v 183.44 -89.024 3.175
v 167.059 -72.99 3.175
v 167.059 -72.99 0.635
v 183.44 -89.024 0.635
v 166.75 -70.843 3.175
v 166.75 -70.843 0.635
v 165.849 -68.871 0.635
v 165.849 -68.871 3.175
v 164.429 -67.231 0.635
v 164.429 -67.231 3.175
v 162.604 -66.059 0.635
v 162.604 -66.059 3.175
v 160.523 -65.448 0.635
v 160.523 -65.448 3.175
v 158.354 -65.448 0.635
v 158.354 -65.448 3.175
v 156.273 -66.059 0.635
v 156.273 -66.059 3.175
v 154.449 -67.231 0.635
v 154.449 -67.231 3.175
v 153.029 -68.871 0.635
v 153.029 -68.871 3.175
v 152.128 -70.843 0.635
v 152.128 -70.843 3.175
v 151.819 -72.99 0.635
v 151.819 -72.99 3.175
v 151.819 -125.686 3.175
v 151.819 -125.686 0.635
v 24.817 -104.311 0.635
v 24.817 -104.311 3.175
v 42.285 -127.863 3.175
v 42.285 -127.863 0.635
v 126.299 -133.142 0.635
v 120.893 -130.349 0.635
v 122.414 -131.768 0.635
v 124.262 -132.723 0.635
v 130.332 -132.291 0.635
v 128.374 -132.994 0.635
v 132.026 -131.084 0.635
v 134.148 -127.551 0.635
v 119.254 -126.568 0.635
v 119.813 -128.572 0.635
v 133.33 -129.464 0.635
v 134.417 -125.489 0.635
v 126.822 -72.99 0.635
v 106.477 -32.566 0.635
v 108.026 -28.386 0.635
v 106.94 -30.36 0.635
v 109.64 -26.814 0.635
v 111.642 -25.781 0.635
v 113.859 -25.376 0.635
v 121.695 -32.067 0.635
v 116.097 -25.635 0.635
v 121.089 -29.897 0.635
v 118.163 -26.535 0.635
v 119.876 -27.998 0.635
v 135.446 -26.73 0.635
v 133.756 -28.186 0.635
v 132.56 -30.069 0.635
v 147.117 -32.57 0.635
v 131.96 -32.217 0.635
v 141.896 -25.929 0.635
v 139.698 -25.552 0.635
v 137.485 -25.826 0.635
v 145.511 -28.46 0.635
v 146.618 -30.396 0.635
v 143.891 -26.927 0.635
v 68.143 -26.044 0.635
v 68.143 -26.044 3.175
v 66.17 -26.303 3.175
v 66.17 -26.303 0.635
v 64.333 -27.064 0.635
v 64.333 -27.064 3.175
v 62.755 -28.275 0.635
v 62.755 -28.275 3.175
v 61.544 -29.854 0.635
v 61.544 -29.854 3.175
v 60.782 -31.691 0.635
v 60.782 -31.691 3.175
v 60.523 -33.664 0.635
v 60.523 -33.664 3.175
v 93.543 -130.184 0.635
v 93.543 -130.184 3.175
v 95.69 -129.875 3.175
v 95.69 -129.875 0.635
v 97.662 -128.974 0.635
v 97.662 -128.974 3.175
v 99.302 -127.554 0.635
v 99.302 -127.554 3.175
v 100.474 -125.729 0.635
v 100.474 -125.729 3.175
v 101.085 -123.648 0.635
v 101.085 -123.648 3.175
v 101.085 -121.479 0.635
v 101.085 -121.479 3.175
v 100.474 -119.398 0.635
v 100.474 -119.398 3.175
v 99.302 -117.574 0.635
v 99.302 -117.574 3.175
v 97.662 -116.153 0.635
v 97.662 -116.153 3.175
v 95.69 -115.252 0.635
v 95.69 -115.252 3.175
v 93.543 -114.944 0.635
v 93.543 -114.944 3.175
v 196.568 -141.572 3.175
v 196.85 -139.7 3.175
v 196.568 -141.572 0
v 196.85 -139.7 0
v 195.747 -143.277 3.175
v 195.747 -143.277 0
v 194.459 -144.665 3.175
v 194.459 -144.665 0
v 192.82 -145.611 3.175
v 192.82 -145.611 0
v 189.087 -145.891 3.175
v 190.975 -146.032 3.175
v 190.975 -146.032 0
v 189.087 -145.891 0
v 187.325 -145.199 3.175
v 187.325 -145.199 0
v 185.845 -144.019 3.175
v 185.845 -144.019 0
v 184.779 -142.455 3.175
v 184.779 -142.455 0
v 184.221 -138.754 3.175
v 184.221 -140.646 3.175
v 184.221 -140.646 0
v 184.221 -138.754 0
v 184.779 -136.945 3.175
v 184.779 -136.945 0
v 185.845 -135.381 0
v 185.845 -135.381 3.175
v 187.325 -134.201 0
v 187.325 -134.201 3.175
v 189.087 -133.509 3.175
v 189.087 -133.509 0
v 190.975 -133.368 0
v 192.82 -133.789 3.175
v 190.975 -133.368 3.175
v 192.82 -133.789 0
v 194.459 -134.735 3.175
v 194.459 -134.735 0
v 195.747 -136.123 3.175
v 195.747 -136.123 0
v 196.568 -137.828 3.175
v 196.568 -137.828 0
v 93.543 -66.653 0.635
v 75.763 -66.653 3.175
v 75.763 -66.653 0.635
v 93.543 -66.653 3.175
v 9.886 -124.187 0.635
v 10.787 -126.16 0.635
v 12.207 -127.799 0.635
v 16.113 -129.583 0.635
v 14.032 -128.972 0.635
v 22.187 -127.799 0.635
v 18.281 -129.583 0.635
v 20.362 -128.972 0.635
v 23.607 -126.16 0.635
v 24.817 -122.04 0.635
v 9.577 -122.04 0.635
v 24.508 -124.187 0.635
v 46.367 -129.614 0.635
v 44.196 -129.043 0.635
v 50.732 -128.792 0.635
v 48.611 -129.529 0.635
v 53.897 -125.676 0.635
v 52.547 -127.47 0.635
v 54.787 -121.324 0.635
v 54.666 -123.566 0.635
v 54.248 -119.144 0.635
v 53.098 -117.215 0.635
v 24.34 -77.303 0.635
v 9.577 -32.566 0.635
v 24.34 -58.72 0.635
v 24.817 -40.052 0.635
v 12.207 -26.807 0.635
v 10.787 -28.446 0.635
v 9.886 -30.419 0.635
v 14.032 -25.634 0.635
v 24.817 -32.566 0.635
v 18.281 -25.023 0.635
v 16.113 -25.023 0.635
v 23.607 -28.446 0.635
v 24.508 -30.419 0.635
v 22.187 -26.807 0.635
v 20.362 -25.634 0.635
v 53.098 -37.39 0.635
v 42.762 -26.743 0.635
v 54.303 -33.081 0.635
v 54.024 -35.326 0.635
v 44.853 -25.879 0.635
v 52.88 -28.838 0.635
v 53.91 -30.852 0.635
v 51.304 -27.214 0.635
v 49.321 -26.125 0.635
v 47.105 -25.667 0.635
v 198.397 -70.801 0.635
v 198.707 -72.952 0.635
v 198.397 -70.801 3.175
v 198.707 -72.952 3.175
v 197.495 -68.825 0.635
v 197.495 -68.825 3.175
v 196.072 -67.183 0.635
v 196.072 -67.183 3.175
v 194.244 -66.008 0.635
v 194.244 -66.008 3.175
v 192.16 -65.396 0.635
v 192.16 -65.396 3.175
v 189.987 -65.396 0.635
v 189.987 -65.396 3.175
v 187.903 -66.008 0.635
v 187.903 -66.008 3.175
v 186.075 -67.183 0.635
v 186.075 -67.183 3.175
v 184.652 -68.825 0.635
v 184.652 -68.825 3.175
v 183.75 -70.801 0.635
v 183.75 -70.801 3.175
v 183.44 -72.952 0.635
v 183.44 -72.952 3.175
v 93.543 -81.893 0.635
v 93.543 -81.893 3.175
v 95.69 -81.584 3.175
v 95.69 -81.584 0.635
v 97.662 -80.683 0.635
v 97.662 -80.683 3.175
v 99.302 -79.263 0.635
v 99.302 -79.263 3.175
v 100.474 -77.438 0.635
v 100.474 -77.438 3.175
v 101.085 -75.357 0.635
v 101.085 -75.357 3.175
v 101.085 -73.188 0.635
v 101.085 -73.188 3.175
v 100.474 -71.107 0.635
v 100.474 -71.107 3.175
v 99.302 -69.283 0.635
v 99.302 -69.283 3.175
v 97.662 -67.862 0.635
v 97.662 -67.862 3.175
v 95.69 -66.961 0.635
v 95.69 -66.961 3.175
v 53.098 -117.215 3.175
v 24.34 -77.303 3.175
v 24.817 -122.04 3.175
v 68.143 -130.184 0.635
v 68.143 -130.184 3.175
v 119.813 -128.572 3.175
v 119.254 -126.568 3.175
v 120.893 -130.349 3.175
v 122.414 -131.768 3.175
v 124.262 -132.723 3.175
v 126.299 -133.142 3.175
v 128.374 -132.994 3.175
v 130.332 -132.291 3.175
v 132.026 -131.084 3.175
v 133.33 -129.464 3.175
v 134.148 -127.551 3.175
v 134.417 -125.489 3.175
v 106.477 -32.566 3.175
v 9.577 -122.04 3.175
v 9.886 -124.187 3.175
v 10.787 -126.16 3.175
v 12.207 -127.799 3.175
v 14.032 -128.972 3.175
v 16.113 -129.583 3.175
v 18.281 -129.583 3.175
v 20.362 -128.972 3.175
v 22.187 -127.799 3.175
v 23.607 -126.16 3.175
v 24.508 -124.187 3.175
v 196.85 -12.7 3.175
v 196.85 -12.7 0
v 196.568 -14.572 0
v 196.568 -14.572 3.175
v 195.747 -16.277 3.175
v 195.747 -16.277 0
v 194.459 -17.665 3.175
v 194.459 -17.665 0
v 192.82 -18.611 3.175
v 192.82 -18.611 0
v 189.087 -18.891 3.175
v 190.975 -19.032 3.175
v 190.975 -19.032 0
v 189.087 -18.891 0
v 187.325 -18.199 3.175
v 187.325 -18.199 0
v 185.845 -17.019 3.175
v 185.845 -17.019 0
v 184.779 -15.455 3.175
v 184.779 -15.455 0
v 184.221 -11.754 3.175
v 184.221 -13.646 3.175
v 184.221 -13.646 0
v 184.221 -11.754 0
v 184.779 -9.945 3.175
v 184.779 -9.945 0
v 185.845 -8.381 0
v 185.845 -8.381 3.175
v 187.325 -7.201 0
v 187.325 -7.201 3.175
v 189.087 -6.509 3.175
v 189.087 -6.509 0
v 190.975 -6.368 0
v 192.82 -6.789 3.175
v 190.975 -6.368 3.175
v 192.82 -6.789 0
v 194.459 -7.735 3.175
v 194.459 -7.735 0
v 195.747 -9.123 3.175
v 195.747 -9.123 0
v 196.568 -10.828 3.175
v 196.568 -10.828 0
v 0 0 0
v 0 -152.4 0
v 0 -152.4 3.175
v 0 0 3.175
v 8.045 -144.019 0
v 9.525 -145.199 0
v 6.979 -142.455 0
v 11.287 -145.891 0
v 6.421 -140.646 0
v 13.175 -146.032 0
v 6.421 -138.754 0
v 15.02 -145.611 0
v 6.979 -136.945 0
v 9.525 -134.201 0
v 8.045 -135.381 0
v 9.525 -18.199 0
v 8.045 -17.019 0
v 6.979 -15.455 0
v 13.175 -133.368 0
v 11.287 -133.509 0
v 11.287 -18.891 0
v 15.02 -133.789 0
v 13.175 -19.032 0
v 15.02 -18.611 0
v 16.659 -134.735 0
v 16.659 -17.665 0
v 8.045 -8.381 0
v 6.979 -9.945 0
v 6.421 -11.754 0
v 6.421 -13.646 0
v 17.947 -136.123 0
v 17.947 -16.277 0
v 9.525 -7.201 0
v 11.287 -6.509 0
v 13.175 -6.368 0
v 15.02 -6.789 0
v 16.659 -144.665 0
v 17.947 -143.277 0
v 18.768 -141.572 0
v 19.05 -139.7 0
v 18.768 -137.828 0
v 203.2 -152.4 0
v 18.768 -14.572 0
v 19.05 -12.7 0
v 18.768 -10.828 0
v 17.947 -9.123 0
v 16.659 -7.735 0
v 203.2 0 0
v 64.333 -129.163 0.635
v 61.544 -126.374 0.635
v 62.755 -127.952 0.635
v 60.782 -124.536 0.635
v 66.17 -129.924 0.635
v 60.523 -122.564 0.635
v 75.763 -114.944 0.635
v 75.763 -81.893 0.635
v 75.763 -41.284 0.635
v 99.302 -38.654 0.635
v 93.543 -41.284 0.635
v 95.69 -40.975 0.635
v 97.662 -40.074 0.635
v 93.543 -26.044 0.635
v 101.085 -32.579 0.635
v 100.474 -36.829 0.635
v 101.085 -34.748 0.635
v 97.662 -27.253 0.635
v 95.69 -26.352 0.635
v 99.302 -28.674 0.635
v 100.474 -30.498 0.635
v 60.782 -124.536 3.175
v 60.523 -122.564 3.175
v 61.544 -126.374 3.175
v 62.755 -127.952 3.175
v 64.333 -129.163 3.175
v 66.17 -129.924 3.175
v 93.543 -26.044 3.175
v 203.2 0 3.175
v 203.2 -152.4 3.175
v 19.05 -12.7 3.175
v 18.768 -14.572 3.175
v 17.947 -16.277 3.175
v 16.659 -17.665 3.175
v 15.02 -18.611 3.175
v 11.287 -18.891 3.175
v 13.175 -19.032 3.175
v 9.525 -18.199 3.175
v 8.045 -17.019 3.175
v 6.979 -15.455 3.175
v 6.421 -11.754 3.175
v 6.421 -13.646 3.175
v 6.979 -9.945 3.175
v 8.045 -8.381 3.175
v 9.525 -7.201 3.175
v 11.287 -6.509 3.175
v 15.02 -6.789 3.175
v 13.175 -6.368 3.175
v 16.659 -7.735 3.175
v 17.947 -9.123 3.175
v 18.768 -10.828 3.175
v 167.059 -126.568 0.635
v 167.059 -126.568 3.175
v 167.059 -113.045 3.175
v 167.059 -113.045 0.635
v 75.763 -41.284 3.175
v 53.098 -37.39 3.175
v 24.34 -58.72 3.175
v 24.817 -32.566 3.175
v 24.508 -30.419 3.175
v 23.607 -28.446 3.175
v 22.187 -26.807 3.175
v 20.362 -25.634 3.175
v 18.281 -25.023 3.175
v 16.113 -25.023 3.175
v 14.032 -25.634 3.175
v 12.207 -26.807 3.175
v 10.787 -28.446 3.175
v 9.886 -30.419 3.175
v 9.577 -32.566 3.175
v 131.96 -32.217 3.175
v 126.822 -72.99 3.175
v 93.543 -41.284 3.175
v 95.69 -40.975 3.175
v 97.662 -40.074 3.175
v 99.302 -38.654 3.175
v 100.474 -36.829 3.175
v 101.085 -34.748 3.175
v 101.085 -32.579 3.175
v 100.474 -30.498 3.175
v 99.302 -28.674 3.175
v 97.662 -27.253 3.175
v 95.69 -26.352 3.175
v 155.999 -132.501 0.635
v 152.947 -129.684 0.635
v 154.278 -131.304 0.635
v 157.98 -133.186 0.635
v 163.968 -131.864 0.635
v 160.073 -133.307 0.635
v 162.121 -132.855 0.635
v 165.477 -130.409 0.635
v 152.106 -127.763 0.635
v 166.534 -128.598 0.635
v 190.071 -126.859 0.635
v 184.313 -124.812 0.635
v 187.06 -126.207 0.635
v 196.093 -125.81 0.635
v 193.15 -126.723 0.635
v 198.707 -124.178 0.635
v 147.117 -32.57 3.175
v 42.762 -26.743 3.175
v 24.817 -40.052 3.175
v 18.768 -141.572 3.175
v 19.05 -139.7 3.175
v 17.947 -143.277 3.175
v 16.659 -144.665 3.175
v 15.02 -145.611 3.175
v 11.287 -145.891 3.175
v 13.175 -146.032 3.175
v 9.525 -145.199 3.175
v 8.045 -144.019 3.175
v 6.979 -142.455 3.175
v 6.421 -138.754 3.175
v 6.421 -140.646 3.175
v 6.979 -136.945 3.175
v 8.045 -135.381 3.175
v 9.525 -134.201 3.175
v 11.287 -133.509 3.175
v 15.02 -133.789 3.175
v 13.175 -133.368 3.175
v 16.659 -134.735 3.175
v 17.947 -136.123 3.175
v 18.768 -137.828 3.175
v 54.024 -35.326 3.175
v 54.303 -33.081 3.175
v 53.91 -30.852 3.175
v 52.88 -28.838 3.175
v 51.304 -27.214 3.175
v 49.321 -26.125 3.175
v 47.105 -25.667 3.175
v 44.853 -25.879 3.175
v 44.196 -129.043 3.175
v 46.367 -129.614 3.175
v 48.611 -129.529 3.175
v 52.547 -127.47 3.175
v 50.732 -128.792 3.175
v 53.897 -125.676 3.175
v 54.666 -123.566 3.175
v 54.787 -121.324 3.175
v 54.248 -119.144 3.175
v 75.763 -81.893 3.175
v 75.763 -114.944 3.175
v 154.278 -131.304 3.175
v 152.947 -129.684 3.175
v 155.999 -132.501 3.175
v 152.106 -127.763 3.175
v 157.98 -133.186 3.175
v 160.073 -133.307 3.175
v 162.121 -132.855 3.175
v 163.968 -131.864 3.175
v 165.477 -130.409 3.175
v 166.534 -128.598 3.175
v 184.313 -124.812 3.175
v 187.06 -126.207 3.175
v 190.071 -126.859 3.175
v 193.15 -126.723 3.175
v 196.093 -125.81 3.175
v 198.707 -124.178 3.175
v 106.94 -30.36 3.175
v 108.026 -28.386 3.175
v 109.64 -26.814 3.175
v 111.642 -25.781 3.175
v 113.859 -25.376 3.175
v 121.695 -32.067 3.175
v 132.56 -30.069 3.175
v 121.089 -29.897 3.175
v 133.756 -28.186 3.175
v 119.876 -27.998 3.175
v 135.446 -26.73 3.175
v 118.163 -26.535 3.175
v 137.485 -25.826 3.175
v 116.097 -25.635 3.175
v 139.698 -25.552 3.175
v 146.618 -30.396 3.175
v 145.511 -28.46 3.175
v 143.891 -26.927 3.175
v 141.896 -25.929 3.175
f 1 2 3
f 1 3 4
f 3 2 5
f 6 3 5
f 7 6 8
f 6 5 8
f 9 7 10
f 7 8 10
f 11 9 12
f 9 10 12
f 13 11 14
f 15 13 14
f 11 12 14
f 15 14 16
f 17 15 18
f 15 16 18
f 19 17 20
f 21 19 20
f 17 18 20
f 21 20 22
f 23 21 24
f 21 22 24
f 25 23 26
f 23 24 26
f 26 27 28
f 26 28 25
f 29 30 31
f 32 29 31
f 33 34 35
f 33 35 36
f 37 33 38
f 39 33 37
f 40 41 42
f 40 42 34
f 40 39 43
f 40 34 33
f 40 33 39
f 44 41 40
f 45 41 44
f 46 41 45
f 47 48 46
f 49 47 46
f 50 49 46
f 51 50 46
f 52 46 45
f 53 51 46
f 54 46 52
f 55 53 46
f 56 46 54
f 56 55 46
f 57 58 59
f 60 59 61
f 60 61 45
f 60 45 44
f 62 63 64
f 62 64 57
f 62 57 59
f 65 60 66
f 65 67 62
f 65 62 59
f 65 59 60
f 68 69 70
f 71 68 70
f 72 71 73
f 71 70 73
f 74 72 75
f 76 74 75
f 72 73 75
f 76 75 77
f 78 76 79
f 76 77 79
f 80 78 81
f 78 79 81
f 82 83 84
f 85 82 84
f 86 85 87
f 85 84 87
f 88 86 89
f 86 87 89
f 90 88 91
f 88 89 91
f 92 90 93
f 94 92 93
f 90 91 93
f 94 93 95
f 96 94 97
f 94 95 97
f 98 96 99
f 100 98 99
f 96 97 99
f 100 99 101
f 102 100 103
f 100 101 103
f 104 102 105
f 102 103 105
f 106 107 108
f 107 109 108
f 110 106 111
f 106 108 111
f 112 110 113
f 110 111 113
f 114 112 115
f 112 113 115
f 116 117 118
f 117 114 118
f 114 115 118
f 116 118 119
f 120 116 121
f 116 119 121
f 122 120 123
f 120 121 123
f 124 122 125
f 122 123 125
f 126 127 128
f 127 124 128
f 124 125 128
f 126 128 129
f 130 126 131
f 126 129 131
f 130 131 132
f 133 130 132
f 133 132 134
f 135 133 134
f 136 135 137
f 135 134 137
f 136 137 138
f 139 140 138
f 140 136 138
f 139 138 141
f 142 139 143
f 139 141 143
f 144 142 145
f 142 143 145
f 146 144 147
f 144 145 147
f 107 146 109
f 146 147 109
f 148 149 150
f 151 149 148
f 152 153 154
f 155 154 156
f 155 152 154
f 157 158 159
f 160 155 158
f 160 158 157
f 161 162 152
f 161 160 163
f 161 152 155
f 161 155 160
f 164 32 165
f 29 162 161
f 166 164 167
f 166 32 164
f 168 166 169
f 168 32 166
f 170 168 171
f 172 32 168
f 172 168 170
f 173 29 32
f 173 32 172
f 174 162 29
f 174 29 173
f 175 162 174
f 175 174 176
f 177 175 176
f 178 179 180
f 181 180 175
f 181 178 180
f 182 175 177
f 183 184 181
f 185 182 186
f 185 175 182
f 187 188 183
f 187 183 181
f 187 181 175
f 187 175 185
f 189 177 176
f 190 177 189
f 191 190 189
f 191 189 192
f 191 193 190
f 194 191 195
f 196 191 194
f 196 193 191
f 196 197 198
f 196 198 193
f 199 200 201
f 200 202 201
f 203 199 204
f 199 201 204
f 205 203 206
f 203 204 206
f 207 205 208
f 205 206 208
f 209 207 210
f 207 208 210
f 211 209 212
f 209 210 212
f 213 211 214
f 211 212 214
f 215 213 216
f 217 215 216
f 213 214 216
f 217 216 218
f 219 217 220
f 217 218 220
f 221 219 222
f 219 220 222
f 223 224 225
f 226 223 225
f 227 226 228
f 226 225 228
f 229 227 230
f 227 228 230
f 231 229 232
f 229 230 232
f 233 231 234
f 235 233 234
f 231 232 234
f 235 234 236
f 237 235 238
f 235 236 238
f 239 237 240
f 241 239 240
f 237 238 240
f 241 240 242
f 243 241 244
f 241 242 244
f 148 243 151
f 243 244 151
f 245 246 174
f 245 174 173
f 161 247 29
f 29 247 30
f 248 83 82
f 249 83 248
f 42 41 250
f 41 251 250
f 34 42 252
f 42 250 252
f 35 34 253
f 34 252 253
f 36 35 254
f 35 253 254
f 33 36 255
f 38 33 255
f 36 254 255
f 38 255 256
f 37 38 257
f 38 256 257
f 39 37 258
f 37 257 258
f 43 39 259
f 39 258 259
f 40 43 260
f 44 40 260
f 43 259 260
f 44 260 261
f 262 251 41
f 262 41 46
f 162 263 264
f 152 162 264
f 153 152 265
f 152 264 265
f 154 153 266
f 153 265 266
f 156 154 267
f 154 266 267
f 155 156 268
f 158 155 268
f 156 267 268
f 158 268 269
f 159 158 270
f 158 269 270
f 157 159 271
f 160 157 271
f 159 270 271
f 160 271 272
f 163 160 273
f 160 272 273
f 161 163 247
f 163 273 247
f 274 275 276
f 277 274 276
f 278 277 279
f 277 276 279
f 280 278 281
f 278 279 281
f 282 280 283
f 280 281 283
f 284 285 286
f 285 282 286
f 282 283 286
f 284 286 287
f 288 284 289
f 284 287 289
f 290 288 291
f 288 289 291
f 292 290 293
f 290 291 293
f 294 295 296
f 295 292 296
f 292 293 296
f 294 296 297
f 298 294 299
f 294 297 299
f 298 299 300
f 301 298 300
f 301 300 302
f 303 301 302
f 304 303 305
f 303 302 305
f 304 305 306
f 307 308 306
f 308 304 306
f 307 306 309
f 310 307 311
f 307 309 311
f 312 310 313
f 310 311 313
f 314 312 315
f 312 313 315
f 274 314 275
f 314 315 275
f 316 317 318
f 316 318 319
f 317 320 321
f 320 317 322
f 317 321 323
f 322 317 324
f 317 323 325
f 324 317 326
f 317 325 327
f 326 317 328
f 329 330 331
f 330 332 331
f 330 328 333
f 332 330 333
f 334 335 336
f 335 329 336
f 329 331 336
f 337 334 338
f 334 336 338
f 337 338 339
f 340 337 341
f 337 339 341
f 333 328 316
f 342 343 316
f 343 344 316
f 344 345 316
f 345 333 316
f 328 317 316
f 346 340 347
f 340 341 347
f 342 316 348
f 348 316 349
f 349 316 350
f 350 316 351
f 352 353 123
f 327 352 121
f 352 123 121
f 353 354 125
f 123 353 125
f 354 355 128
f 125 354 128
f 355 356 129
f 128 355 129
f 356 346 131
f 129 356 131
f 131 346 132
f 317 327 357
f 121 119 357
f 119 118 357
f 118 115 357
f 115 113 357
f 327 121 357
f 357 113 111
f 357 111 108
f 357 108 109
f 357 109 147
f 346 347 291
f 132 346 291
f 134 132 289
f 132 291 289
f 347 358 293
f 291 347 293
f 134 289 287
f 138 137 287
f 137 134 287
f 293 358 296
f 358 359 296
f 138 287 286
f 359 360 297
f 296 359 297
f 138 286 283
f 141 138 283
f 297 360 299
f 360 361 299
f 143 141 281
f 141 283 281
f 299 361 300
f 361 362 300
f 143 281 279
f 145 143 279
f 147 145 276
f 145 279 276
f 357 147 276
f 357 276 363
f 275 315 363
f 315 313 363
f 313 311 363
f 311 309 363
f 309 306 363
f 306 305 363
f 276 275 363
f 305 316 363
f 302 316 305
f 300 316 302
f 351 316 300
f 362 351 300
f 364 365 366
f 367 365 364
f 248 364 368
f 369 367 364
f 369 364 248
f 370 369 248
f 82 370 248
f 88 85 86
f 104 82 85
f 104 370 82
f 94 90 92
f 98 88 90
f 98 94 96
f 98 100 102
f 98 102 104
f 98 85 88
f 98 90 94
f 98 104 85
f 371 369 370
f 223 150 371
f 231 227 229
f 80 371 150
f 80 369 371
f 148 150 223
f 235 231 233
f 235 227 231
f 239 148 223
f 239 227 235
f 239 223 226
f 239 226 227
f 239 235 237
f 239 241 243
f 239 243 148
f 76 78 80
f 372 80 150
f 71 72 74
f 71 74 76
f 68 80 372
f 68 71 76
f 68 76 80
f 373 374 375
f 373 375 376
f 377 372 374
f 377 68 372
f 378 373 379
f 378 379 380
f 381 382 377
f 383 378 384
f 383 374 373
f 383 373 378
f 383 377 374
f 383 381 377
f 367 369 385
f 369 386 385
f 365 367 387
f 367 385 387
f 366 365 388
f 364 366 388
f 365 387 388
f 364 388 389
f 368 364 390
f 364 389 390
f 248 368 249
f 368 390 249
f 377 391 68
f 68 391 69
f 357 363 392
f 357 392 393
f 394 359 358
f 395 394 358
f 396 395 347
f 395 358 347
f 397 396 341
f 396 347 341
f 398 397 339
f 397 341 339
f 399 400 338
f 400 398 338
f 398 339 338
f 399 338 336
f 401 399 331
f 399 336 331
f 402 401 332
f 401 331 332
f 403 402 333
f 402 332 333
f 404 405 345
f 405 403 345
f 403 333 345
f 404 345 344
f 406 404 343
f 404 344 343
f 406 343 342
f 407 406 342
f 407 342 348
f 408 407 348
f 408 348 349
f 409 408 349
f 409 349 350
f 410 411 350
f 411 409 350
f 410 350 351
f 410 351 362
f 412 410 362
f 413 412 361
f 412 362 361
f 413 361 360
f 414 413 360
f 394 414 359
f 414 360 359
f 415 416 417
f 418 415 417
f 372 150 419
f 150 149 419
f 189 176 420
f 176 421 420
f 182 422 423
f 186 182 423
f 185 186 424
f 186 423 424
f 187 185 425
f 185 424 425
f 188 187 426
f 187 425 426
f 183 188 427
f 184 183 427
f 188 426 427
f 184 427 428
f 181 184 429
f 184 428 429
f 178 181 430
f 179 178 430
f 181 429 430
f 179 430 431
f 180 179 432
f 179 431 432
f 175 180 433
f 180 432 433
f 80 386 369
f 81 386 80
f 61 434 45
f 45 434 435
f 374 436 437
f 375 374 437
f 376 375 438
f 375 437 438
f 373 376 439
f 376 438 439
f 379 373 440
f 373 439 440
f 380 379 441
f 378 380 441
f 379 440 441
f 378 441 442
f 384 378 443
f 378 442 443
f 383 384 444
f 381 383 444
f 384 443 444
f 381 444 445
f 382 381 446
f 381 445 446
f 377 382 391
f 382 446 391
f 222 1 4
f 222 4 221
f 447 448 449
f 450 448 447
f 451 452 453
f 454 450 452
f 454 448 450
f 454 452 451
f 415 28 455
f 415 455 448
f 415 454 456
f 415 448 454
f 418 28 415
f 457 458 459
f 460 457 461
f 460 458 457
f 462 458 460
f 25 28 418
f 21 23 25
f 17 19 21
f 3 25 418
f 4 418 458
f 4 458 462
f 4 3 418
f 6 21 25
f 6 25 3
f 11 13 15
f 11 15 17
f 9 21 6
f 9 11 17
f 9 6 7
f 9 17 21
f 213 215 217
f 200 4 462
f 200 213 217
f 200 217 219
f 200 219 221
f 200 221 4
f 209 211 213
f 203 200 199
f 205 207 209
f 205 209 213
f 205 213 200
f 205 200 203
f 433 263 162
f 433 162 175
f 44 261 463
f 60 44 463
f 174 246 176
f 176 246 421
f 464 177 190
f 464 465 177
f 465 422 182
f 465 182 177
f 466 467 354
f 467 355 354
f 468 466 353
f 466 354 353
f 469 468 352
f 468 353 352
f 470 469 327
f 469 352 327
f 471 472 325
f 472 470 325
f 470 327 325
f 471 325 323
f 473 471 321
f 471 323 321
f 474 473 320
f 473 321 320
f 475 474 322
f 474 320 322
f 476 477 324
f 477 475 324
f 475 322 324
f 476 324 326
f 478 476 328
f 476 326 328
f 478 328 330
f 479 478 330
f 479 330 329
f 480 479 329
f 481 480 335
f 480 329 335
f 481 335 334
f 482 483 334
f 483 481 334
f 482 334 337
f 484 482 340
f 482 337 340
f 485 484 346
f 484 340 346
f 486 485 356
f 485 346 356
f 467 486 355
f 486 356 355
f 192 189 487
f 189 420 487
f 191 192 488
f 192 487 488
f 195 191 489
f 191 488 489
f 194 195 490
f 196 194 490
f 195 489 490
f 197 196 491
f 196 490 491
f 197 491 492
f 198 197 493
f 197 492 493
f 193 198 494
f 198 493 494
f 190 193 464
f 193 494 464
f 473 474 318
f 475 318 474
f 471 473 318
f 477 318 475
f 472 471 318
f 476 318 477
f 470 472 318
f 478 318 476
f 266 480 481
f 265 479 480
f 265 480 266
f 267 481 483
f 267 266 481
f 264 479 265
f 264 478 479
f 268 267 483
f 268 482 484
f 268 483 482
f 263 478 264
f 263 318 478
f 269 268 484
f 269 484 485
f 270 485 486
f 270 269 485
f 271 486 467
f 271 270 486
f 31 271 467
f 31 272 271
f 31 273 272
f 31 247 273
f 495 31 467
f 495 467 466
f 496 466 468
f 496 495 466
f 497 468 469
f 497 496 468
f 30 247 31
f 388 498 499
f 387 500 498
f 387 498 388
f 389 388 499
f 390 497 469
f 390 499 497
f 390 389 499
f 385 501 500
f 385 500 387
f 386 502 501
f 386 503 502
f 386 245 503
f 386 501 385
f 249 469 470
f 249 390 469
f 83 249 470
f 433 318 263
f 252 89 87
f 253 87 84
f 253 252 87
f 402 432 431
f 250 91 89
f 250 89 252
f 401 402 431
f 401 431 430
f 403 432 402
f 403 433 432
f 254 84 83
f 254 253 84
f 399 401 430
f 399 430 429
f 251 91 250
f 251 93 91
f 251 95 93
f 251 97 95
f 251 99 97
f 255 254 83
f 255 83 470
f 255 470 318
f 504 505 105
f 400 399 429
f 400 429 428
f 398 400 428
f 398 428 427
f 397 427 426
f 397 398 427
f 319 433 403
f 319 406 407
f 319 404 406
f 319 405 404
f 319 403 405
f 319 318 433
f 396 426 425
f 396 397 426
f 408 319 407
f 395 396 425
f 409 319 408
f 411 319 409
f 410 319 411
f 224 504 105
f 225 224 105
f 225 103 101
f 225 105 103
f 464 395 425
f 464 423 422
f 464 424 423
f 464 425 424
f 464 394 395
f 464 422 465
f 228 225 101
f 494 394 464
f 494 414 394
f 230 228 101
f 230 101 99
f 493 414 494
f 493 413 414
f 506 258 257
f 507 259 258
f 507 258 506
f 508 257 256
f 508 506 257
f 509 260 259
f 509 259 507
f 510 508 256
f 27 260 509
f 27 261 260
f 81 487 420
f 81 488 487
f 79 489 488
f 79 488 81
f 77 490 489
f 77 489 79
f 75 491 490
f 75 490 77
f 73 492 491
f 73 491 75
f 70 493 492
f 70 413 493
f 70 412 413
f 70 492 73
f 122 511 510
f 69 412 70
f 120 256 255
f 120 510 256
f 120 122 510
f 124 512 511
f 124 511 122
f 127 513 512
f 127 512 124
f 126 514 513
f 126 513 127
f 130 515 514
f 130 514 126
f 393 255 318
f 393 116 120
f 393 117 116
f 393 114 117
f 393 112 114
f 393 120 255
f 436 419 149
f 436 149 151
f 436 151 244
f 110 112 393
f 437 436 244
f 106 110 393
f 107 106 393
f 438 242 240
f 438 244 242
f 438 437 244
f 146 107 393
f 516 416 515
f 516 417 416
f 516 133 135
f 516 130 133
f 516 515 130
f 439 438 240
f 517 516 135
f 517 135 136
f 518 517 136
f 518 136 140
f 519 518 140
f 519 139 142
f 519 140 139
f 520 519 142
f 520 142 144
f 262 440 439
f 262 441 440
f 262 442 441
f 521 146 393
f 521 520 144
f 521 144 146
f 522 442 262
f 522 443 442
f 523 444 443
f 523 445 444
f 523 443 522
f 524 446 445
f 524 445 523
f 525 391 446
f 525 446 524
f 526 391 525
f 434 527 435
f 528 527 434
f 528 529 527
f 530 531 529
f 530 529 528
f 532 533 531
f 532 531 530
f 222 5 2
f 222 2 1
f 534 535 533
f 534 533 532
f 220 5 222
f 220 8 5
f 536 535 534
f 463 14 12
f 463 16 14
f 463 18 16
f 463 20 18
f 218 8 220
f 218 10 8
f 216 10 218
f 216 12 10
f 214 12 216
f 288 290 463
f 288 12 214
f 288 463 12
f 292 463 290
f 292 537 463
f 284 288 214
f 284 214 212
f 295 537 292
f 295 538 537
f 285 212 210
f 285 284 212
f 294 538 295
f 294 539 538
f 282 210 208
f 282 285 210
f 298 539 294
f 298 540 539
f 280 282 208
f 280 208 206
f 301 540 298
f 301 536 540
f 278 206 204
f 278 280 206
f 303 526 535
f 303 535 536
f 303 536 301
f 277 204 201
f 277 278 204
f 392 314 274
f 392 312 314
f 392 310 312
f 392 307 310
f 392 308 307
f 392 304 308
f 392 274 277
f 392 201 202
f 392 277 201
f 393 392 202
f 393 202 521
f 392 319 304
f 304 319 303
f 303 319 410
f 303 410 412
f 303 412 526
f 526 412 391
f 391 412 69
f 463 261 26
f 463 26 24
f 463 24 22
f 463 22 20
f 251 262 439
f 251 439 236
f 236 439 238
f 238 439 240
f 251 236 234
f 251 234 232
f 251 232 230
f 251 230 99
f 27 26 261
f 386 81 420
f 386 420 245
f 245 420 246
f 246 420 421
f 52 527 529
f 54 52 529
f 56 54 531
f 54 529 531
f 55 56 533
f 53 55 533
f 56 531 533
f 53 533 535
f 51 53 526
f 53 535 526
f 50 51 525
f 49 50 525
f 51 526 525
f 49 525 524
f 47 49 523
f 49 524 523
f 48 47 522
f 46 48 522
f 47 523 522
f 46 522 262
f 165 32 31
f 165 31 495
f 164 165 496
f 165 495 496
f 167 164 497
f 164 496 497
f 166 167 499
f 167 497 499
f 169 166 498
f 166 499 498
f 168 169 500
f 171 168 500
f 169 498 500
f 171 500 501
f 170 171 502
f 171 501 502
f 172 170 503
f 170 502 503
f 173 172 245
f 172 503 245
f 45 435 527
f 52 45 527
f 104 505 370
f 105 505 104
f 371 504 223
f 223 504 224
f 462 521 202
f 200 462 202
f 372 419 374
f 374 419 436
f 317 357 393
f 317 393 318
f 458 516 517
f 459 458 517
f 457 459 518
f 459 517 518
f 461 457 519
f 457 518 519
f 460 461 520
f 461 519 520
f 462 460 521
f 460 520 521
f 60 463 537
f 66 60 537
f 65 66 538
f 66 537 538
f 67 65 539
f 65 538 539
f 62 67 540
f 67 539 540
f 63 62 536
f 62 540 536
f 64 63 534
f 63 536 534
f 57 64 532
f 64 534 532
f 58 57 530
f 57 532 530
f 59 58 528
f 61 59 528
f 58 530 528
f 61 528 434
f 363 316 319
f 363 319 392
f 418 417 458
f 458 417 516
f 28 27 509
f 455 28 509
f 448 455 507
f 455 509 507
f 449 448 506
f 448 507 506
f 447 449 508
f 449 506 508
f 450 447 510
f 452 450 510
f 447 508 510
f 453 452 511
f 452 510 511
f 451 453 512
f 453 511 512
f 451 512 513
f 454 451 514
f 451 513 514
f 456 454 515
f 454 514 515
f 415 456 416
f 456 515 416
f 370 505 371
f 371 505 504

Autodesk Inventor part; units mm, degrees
ref_plane "YZ Plane" through (0, 0, 0) normal (1, 0, 0) x (0, 1, 0)
ref_plane "XZ Plane" through (0, 0, 0) normal (0, 1, 0) x (-1, 0, 0)
ref_plane "XY Plane" through (0, 0, 0) normal (0, 0, 1) x (1, 0, 0)
sketch "Sketch1" plane through (0, 0, 0) normal (0, 0, 1) x (1, 0, 0)
  line L0 (0, 0) -> (203.2, 0)
  line L1 (203.2, 0) -> (203.2, -152.4)
  line L2 (203.2, -152.4) -> (0, -152.4)
  line L3 (0, -152.4) -> (0, 0)
  line L4 (0, 0) -> (12.7, 0)
  line L5 (0, -12.7) -> (0, 0)
  line L6 (0, -152.4) -> (0, -139.7)
  line L7 (203.2, 0) -> (190.5, 0)
  line L8 (203.2, -152.4) -> (203.2, -139.7)
  circle A0 centre (12.7, -12.7) radius 6.35
  circle A1 centre (190.5, -12.7) radius 6.35
  circle A2 centre (190.5, -139.7) radius 6.35
  circle A3 centre (12.7, -139.7) radius 6.35
extrude "Extrusion1" add sketch "Sketch1" along normal blind 3.175
sketch "Sketch2" plane through (0, 0, 3.175) normal (0, 0, 1) x (1, 0, 0)
  arc A0 (24.817, -32.5655) -> (9.577, -32.5655) centre (17.197, -32.5655) ccw
  arc A1 (9.577, -122.0402) -> (24.817, -122.0402) centre (17.197, -122.0402) ccw
  line L0 (9.577, -32.5655) -> (9.577, -122.0402)
  line L1 (9.577, -42.2151) -> (9.577, -32.5655)
  arc A2 (53.0983, -37.3903) -> (42.7617, -26.7428) centre (46.6851, -33.275) ccw
  arc A3 (49.095, -40.7739) -> (42.7617, -26.7428) centre (46.7521, -33.3865) ccw
  line L2 (42.7617, -26.7428) -> (24.817, -40.0522)
  line L3 (53.0983, -37.3903) -> (24.3404, -58.7199)
  arc A4 (42.2851, -127.8629) -> (53.0983, -117.2154) centre (47.2004, -122.0402) ccw
  line L4 (53.0983, -117.2154) -> (24.3404, -77.3028)
  line L5 (42.2851, -127.8629) -> (24.817, -104.3113)
  line L6 (24.817, -104.3113) -> (24.817, -122.0402)
  line L7 (24.3404, -58.7199) -> (24.3404, -77.3028)
  line L8 (24.817, -40.0522) -> (24.817, -32.5655)
  line L9 (60.5227, -33.6636) -> (60.5227, -122.5636)
  line L10 (68.1427, -130.1836) -> (93.5427, -130.1836)
  line L11 (93.5427, -114.9436) -> (75.7627, -114.9436)
  line L12 (68.1427, -26.0436) -> (93.5427, -26.0436)
  line L13 (93.5427, -41.2836) -> (75.7627, -41.2836)
  arc A5 (68.1427, -26.0436) -> (60.5227, -33.6636) centre (68.1427, -33.6636) ccw
  arc A6 (60.5227, -122.5636) -> (68.1427, -130.1836) centre (68.1427, -122.5636) ccw
  arc A7 (93.5427, -130.1836) -> (93.5427, -114.9436) centre (93.5427, -122.5636) ccw
  arc A8 (93.5427, -41.2836) -> (93.5427, -26.0436) centre (93.5427, -33.6636) ccw
  arc A9 (93.5427, -81.8927) -> (93.5427, -66.6527) centre (93.5427, -74.2727) ccw
  line L14 (93.5427, -66.6527) -> (75.7627, -66.6527)
  line L15 (93.5427, -81.8927) -> (75.7627, -81.8927)
  line L16 (75.7627, -41.2836) -> (75.7627, -66.6527)
  line L17 (75.7627, -81.8927) -> (75.7627, -114.9436)
  line L18 (147.1171, -32.5701) -> (134.4171, -125.4887)
  line L19 (106.4768, -32.5655) -> (119.2541, -126.5682)
  line L20 (121.6953, -32.0671) -> (126.8219, -72.9902)
  line L21 (126.8219, -72.9902) -> (131.9604, -32.2167)
  arc A10 (147.1171, -32.5701) -> (131.9604, -32.2167) centre (139.5207, -33.1695) ccw
  arc A11 (119.2541, -126.5682) -> (134.4171, -125.4887) centre (126.801, -125.5424) ccw
  arc A12 (121.6953, -32.0671) -> (106.4768, -32.5655) centre (114.109, -33.0174) ccw
  line L22 (151.8189, -72.9902) -> (151.8189, -126.5682)
  arc A13 (167.0589, -72.9902) -> (151.8189, -72.9902) centre (159.4389, -72.9902) ccw
  arc A14 (151.8189, -125.6862) -> (167.0589, -126.5682) centre (159.4644, -125.6862) ccw
  line L23 (198.7066, -72.9518) -> (198.7066, -124.1784)
  line L24 (184.3126, -124.8116) -> (167.0589, -113.0447)
  line L25 (183.4405, -72.9518) -> (183.4405, -89.0244)
  line L26 (183.4405, -89.0244) -> (167.0589, -72.9902)
  line L27 (167.0589, -113.0447) -> (167.0589, -126.5682)
  arc A15 (198.7066, -72.9518) -> (183.4405, -72.9518) centre (191.0735, -72.9518) ccw
  arc A16 (184.3126, -124.8116) -> (198.7066, -124.1784) centre (191.0866, -114.8789) ccw
  point P0 (0, 0)
emboss "Emboss1" sketch "Sketch2" operation cut depth 2.54 direction (0, 0, -1)
properties part number "NamePlate"
